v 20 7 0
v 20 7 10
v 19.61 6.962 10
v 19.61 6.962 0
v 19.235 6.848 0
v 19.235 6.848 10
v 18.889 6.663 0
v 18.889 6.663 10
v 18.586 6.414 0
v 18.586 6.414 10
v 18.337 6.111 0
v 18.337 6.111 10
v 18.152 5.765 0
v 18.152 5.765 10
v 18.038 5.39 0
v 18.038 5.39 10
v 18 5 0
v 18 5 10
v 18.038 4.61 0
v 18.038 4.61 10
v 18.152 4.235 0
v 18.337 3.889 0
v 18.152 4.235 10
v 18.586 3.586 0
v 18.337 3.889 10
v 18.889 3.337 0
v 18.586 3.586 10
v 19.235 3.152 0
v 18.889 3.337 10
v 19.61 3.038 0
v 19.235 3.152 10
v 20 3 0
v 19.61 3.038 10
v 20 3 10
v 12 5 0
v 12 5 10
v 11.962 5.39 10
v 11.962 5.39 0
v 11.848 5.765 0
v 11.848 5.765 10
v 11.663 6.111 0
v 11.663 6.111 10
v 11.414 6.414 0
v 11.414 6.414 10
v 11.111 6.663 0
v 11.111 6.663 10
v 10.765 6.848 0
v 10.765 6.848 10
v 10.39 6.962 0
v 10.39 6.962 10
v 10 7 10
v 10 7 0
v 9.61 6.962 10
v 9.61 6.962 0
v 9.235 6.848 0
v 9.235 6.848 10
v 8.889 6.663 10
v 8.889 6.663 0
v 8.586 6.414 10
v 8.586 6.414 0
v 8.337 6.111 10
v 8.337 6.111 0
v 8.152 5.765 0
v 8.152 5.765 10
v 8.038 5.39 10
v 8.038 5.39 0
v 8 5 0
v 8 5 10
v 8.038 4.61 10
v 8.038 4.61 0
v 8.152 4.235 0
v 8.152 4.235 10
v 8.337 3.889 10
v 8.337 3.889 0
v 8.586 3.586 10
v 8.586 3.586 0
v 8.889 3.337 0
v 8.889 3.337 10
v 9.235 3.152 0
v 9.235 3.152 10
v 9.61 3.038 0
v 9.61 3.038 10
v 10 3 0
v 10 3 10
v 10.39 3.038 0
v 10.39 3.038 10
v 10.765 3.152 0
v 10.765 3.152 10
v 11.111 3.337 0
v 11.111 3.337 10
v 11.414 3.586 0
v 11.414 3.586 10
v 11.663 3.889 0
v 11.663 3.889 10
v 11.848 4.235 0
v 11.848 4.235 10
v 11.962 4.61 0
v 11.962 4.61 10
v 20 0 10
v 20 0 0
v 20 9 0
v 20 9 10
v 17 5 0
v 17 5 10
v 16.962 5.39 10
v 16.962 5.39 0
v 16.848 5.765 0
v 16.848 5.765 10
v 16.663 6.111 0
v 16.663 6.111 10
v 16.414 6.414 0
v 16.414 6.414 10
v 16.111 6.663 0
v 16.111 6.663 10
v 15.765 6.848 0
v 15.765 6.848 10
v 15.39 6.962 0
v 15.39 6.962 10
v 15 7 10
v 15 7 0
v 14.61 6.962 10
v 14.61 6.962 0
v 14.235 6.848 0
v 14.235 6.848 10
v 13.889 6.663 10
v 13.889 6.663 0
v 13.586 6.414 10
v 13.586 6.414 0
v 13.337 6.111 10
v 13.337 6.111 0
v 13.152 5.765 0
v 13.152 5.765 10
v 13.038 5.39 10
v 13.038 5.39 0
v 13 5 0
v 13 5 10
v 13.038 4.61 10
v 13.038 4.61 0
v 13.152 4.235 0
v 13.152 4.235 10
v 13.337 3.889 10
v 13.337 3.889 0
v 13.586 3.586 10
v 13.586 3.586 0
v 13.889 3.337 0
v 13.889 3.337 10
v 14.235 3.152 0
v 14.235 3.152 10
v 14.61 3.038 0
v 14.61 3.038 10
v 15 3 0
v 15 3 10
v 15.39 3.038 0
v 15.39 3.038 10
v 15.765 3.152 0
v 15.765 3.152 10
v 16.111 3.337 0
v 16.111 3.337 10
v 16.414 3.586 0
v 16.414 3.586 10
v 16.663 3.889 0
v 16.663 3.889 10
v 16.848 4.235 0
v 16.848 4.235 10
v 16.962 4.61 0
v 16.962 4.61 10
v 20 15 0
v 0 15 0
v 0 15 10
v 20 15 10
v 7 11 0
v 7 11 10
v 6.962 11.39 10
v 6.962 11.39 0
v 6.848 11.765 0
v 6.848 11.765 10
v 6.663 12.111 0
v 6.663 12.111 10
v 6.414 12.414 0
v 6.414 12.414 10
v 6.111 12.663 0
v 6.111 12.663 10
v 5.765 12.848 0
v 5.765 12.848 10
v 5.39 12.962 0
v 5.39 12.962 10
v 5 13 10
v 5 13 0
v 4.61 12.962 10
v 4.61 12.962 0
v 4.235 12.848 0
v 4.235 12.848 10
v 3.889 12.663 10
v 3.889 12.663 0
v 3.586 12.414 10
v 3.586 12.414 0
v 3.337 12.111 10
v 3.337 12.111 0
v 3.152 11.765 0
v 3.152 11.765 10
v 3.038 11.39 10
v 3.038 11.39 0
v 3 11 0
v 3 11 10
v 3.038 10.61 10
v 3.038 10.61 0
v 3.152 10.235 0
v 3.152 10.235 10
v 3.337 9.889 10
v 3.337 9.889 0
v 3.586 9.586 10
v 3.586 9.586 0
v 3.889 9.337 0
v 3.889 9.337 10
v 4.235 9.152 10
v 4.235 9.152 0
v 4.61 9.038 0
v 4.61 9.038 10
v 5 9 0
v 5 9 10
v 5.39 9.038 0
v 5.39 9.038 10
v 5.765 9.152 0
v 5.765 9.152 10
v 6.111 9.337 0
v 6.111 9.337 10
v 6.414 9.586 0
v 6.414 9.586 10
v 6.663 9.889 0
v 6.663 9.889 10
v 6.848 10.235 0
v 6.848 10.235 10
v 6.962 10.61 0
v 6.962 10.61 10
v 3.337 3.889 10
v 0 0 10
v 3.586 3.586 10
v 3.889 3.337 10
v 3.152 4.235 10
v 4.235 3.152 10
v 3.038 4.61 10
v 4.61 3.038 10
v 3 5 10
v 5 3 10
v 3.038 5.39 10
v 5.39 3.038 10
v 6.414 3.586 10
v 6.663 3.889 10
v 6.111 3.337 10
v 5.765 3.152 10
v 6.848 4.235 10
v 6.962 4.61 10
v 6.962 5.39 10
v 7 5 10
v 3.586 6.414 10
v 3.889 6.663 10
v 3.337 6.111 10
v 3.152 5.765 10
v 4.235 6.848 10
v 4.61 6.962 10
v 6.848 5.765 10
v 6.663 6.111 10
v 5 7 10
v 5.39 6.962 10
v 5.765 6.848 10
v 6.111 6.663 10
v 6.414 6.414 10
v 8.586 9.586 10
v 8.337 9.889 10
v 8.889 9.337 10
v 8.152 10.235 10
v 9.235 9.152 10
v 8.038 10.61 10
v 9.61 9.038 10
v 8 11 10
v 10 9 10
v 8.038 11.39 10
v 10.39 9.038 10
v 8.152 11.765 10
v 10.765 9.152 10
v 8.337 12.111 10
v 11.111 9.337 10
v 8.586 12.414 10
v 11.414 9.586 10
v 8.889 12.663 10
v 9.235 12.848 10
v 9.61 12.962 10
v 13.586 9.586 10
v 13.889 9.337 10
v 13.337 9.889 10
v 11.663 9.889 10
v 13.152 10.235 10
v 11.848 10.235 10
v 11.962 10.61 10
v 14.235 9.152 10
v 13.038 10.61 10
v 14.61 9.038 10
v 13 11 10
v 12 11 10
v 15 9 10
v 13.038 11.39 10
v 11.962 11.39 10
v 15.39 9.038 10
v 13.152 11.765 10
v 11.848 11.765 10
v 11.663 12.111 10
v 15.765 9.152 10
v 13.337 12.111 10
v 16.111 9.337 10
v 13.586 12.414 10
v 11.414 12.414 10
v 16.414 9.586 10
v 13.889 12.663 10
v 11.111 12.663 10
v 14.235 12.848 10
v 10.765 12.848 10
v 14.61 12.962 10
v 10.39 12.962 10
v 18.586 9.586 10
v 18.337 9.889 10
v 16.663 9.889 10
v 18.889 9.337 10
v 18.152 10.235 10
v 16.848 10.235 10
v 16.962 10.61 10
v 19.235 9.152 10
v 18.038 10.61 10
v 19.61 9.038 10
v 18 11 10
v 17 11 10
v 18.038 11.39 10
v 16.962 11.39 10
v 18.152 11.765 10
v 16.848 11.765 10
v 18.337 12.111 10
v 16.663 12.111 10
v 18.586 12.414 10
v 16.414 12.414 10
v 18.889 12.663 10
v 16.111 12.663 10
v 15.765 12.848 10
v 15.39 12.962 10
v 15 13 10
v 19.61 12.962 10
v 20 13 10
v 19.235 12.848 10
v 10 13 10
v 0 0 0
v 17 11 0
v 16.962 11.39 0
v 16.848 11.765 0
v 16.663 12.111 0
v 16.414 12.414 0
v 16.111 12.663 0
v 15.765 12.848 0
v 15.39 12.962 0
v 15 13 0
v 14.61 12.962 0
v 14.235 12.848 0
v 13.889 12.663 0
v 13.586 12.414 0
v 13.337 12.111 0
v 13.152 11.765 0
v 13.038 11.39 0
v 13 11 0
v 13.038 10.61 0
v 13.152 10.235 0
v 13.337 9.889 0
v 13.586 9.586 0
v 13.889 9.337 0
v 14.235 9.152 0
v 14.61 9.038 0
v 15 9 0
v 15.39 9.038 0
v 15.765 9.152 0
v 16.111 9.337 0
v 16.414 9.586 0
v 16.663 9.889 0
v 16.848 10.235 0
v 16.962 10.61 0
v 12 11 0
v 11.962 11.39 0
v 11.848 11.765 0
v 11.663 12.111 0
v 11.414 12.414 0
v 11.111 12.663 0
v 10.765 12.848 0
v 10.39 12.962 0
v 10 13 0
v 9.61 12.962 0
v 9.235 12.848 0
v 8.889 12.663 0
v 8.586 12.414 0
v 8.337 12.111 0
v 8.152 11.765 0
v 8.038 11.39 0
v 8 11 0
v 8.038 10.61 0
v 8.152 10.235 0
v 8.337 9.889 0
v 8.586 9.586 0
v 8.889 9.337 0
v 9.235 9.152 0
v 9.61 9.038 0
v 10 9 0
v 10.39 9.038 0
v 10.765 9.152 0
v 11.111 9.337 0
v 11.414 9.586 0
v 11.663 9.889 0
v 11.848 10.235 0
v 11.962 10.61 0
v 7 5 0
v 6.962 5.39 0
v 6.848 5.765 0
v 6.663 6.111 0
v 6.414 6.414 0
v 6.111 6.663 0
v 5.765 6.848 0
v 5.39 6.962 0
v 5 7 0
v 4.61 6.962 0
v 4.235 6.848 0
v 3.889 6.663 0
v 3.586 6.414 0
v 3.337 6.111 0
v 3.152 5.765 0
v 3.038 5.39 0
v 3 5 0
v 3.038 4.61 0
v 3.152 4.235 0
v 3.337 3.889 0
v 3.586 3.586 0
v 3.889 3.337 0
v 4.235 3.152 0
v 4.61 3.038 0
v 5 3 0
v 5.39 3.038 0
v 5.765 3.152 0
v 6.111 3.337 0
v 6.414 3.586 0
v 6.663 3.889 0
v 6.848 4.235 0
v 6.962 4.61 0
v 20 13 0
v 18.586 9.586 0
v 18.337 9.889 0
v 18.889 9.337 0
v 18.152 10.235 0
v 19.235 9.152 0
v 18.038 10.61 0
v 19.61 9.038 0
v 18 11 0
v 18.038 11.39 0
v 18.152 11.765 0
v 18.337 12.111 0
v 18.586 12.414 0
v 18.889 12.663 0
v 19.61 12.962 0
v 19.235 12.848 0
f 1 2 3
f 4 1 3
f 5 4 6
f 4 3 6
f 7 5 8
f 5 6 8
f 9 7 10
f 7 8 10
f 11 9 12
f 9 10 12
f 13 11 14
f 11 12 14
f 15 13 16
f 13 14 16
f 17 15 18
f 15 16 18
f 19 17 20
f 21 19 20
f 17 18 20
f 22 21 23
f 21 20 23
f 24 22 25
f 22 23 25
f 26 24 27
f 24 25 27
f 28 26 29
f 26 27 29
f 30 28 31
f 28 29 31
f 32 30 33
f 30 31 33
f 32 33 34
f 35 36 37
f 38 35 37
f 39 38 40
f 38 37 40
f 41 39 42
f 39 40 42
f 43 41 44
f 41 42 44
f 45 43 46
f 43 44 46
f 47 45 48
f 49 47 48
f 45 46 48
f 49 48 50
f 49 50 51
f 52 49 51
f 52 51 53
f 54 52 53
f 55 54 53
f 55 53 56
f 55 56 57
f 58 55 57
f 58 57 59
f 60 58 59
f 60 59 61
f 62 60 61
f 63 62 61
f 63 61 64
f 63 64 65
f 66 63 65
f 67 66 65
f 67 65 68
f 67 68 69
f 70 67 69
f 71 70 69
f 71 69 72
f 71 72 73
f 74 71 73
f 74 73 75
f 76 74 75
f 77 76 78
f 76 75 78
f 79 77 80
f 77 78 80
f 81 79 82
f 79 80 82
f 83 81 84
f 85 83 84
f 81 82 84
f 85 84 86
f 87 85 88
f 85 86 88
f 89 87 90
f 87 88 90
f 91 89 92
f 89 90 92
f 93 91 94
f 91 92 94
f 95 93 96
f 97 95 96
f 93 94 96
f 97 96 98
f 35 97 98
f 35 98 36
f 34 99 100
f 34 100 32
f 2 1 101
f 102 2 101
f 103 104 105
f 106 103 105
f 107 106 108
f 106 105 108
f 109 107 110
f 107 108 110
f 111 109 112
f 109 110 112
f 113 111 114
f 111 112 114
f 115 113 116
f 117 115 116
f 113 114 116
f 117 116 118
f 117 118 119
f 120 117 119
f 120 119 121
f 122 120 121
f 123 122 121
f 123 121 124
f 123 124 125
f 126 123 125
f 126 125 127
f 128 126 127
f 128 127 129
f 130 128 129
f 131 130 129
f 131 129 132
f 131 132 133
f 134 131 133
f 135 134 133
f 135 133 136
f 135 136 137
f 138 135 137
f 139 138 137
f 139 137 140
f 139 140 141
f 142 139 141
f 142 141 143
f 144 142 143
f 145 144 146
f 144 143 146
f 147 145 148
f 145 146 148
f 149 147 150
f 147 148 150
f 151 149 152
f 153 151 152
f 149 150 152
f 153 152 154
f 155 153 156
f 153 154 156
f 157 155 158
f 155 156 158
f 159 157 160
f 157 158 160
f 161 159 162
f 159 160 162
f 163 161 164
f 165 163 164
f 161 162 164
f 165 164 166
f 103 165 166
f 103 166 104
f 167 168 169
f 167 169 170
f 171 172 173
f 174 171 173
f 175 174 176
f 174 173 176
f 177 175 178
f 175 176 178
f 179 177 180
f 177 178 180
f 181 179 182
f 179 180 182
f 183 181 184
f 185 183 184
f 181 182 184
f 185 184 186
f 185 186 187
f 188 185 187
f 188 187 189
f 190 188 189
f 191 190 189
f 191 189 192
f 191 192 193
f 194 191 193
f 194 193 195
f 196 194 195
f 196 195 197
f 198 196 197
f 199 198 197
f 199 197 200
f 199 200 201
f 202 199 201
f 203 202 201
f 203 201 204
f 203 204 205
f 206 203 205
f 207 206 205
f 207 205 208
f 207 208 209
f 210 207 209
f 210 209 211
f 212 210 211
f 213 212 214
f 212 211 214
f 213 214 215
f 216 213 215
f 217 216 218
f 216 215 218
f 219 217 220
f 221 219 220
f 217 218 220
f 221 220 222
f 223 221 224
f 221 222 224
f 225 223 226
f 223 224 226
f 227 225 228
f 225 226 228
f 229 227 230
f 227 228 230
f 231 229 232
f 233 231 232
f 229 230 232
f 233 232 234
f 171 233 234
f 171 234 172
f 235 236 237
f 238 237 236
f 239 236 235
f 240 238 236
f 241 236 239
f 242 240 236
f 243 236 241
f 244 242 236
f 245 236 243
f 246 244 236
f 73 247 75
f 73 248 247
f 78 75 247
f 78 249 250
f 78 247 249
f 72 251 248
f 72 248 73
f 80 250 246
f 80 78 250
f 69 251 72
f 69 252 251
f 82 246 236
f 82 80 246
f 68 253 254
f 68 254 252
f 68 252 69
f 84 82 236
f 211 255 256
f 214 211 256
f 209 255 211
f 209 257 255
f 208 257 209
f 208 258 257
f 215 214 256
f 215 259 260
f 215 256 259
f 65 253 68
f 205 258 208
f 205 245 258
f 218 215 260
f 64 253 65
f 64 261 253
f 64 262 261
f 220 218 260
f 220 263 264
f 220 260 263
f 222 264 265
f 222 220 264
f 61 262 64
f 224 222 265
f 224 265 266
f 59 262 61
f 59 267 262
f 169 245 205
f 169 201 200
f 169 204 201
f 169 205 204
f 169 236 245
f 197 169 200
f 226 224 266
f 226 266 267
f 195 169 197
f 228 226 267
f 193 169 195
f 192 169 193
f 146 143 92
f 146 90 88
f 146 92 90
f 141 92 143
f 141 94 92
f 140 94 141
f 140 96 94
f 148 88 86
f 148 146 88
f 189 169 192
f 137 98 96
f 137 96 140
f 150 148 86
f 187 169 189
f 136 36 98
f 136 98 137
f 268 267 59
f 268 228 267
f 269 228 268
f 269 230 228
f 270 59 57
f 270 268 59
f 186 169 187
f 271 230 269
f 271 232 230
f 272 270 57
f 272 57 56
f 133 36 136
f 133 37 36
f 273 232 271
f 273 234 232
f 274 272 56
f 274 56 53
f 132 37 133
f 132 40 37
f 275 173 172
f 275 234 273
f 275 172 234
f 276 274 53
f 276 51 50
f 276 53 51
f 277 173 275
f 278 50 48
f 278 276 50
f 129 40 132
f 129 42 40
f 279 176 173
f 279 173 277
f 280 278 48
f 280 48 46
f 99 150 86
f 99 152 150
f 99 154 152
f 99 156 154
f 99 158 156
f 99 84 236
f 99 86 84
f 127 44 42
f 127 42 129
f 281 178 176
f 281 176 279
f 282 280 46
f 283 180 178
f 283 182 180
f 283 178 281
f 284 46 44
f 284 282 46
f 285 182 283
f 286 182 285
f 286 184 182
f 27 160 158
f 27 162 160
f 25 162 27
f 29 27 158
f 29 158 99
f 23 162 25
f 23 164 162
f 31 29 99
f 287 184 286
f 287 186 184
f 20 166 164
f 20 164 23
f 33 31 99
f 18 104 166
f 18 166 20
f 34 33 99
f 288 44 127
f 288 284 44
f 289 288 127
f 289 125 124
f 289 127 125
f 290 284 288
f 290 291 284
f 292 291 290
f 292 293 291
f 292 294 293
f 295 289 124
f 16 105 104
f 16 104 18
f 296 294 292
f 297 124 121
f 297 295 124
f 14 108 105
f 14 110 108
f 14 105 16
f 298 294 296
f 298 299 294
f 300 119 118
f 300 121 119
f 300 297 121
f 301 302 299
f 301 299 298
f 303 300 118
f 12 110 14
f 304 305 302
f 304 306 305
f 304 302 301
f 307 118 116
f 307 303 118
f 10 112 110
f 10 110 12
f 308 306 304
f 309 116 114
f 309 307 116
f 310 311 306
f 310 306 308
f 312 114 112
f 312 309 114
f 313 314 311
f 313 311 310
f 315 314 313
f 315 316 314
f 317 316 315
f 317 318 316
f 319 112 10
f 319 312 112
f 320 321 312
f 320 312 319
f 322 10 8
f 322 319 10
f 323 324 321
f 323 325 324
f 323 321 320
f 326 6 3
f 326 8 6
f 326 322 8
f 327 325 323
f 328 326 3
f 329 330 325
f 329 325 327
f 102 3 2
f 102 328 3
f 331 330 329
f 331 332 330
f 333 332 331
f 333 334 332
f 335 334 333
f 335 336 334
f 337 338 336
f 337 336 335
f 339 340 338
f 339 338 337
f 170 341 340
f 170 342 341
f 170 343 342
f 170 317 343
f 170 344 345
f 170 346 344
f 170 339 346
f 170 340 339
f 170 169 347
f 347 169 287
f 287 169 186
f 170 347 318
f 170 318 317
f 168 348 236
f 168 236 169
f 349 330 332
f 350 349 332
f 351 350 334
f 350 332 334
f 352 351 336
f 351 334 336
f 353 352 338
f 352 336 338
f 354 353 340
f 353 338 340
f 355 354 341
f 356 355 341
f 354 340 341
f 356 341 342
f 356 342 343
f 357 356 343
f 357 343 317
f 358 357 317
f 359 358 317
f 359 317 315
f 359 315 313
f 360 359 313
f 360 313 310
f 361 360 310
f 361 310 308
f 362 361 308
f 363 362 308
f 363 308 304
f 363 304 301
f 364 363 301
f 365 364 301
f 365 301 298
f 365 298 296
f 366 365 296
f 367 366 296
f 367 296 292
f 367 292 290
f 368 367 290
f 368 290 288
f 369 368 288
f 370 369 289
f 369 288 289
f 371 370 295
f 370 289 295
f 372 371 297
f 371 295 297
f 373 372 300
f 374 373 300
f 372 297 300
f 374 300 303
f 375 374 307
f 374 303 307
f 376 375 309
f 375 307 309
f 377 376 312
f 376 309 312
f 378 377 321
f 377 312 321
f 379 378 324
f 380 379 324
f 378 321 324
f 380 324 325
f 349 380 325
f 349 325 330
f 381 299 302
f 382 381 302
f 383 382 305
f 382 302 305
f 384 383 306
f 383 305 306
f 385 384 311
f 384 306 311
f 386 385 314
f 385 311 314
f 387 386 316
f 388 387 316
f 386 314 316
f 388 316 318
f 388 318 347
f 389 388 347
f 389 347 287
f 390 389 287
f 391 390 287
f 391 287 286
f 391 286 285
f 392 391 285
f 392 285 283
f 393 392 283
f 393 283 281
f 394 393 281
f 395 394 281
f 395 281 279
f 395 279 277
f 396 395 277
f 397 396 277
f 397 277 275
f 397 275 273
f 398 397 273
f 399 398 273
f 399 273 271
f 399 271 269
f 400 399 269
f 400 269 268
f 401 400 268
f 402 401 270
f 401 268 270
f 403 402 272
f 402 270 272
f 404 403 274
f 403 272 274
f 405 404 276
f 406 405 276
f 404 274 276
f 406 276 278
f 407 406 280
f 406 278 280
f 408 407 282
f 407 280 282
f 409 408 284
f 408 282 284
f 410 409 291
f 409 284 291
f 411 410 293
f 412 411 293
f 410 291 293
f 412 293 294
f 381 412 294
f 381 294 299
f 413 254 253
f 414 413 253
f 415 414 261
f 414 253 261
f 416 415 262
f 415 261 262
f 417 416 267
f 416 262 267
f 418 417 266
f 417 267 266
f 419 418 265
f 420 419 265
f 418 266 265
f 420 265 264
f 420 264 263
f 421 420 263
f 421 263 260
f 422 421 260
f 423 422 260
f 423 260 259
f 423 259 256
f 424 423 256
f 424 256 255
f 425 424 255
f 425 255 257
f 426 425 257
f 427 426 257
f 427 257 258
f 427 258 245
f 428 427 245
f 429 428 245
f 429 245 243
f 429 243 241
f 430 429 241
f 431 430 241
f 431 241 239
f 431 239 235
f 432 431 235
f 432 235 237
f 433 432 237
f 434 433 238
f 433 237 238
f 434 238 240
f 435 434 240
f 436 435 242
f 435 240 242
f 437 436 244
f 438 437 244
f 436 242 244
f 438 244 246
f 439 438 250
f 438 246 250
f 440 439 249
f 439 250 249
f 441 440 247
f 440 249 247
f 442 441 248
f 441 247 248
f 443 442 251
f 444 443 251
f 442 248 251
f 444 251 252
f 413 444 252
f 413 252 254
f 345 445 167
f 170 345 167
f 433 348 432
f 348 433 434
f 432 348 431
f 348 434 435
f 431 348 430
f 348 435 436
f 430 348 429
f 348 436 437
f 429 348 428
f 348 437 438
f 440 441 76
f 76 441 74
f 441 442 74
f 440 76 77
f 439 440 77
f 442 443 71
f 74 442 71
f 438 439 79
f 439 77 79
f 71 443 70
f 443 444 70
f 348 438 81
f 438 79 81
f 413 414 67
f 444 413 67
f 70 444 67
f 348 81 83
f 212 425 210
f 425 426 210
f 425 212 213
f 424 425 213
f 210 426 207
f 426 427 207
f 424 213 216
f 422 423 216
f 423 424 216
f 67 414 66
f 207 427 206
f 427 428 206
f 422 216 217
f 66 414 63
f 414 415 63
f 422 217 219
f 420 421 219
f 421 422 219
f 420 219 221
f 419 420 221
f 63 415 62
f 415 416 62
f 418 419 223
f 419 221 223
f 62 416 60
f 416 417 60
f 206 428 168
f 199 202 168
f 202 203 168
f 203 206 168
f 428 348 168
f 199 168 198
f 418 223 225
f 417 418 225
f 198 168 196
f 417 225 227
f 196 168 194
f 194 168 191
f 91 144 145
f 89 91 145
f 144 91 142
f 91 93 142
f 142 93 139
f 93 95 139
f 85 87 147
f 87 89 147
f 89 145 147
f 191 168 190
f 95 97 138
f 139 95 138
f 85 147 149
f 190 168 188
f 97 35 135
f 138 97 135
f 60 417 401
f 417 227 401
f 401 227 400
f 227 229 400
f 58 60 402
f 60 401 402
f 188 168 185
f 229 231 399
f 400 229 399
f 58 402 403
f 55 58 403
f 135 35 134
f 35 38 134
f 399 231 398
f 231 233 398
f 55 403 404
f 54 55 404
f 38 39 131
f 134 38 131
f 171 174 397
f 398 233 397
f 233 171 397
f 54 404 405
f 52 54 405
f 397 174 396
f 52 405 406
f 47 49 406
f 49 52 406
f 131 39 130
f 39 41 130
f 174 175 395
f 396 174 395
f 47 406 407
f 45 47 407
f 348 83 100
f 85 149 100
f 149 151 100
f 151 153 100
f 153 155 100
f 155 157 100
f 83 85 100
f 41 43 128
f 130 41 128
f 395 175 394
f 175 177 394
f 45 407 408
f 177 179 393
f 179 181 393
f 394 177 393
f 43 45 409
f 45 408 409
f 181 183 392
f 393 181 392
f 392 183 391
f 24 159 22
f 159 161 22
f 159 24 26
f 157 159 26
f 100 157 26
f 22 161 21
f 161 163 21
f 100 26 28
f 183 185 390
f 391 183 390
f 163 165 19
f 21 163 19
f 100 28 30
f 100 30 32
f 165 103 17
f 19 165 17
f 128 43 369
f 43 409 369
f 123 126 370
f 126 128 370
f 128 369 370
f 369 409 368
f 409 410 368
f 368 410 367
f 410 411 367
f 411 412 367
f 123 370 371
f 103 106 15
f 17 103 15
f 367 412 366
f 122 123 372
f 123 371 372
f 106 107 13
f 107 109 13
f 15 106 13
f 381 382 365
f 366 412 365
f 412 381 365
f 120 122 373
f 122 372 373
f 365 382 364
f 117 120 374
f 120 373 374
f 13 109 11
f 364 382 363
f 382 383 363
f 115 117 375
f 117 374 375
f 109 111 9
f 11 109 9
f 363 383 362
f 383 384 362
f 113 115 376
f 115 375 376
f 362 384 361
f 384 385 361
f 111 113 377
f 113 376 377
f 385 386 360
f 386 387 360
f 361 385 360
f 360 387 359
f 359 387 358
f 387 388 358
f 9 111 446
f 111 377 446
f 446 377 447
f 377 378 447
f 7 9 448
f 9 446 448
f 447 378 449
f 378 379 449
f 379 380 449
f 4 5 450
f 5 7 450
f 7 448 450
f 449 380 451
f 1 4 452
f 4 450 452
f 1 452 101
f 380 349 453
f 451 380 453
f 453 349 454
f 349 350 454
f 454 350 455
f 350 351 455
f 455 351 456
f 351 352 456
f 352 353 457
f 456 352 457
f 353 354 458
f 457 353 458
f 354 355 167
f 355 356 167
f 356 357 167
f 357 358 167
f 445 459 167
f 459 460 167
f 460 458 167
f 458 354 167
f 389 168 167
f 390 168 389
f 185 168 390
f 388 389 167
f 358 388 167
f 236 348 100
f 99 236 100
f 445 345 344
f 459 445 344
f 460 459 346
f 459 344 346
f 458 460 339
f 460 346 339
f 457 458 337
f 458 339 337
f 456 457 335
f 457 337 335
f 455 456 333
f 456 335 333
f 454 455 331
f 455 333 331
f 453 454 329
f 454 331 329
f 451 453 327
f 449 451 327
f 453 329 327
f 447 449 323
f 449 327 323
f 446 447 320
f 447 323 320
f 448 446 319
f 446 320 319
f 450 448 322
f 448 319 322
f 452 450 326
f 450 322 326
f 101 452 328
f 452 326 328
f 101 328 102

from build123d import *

# Parameters (mm, degrees)
BOX_W               = 20
BOX_H               = 15
BOX_DEPTH           = 10
SKETCH_R            = 2
POCKET_DEPTH        = 11
LINEARPATTERN_COUNT = 3
LINEARPATTERN_PITCH = 5


with BuildPart() as part:
    # Box → Box (new body)
    with BuildSketch(Plane.XY):
        with Locations((10, 7.5)):
            Rectangle(BOX_W, BOX_H)
    extrude(amount=BOX_DEPTH)

    # Sketch (on Face6 of BaseFeature) → Pocket (cut)
    with BuildSketch(Plane.XY.offset(10)):
        with Locations((5, 5)):
            Circle(SKETCH_R)
        with Locations((10, 5)):
            Circle(SKETCH_R)
        with Locations((15, 5)):
            Circle(SKETCH_R)
        with Locations((5, 11)):
            Circle(SKETCH_R)
        with Locations((10, 11)):
            Circle(SKETCH_R)
        with Locations((15, 11)):
            Circle(SKETCH_R)
    pocket = extrude(amount=-POCKET_DEPTH, mode=Mode.SUBTRACT)

    # LinearPattern: Pocket ×3
    with Locations(*[(i * LINEARPATTERN_PITCH, 0, 0) for i in range(1, LINEARPATTERN_COUNT)]):
        add(pocket, mode=Mode.SUBTRACT)


solid = part.part
